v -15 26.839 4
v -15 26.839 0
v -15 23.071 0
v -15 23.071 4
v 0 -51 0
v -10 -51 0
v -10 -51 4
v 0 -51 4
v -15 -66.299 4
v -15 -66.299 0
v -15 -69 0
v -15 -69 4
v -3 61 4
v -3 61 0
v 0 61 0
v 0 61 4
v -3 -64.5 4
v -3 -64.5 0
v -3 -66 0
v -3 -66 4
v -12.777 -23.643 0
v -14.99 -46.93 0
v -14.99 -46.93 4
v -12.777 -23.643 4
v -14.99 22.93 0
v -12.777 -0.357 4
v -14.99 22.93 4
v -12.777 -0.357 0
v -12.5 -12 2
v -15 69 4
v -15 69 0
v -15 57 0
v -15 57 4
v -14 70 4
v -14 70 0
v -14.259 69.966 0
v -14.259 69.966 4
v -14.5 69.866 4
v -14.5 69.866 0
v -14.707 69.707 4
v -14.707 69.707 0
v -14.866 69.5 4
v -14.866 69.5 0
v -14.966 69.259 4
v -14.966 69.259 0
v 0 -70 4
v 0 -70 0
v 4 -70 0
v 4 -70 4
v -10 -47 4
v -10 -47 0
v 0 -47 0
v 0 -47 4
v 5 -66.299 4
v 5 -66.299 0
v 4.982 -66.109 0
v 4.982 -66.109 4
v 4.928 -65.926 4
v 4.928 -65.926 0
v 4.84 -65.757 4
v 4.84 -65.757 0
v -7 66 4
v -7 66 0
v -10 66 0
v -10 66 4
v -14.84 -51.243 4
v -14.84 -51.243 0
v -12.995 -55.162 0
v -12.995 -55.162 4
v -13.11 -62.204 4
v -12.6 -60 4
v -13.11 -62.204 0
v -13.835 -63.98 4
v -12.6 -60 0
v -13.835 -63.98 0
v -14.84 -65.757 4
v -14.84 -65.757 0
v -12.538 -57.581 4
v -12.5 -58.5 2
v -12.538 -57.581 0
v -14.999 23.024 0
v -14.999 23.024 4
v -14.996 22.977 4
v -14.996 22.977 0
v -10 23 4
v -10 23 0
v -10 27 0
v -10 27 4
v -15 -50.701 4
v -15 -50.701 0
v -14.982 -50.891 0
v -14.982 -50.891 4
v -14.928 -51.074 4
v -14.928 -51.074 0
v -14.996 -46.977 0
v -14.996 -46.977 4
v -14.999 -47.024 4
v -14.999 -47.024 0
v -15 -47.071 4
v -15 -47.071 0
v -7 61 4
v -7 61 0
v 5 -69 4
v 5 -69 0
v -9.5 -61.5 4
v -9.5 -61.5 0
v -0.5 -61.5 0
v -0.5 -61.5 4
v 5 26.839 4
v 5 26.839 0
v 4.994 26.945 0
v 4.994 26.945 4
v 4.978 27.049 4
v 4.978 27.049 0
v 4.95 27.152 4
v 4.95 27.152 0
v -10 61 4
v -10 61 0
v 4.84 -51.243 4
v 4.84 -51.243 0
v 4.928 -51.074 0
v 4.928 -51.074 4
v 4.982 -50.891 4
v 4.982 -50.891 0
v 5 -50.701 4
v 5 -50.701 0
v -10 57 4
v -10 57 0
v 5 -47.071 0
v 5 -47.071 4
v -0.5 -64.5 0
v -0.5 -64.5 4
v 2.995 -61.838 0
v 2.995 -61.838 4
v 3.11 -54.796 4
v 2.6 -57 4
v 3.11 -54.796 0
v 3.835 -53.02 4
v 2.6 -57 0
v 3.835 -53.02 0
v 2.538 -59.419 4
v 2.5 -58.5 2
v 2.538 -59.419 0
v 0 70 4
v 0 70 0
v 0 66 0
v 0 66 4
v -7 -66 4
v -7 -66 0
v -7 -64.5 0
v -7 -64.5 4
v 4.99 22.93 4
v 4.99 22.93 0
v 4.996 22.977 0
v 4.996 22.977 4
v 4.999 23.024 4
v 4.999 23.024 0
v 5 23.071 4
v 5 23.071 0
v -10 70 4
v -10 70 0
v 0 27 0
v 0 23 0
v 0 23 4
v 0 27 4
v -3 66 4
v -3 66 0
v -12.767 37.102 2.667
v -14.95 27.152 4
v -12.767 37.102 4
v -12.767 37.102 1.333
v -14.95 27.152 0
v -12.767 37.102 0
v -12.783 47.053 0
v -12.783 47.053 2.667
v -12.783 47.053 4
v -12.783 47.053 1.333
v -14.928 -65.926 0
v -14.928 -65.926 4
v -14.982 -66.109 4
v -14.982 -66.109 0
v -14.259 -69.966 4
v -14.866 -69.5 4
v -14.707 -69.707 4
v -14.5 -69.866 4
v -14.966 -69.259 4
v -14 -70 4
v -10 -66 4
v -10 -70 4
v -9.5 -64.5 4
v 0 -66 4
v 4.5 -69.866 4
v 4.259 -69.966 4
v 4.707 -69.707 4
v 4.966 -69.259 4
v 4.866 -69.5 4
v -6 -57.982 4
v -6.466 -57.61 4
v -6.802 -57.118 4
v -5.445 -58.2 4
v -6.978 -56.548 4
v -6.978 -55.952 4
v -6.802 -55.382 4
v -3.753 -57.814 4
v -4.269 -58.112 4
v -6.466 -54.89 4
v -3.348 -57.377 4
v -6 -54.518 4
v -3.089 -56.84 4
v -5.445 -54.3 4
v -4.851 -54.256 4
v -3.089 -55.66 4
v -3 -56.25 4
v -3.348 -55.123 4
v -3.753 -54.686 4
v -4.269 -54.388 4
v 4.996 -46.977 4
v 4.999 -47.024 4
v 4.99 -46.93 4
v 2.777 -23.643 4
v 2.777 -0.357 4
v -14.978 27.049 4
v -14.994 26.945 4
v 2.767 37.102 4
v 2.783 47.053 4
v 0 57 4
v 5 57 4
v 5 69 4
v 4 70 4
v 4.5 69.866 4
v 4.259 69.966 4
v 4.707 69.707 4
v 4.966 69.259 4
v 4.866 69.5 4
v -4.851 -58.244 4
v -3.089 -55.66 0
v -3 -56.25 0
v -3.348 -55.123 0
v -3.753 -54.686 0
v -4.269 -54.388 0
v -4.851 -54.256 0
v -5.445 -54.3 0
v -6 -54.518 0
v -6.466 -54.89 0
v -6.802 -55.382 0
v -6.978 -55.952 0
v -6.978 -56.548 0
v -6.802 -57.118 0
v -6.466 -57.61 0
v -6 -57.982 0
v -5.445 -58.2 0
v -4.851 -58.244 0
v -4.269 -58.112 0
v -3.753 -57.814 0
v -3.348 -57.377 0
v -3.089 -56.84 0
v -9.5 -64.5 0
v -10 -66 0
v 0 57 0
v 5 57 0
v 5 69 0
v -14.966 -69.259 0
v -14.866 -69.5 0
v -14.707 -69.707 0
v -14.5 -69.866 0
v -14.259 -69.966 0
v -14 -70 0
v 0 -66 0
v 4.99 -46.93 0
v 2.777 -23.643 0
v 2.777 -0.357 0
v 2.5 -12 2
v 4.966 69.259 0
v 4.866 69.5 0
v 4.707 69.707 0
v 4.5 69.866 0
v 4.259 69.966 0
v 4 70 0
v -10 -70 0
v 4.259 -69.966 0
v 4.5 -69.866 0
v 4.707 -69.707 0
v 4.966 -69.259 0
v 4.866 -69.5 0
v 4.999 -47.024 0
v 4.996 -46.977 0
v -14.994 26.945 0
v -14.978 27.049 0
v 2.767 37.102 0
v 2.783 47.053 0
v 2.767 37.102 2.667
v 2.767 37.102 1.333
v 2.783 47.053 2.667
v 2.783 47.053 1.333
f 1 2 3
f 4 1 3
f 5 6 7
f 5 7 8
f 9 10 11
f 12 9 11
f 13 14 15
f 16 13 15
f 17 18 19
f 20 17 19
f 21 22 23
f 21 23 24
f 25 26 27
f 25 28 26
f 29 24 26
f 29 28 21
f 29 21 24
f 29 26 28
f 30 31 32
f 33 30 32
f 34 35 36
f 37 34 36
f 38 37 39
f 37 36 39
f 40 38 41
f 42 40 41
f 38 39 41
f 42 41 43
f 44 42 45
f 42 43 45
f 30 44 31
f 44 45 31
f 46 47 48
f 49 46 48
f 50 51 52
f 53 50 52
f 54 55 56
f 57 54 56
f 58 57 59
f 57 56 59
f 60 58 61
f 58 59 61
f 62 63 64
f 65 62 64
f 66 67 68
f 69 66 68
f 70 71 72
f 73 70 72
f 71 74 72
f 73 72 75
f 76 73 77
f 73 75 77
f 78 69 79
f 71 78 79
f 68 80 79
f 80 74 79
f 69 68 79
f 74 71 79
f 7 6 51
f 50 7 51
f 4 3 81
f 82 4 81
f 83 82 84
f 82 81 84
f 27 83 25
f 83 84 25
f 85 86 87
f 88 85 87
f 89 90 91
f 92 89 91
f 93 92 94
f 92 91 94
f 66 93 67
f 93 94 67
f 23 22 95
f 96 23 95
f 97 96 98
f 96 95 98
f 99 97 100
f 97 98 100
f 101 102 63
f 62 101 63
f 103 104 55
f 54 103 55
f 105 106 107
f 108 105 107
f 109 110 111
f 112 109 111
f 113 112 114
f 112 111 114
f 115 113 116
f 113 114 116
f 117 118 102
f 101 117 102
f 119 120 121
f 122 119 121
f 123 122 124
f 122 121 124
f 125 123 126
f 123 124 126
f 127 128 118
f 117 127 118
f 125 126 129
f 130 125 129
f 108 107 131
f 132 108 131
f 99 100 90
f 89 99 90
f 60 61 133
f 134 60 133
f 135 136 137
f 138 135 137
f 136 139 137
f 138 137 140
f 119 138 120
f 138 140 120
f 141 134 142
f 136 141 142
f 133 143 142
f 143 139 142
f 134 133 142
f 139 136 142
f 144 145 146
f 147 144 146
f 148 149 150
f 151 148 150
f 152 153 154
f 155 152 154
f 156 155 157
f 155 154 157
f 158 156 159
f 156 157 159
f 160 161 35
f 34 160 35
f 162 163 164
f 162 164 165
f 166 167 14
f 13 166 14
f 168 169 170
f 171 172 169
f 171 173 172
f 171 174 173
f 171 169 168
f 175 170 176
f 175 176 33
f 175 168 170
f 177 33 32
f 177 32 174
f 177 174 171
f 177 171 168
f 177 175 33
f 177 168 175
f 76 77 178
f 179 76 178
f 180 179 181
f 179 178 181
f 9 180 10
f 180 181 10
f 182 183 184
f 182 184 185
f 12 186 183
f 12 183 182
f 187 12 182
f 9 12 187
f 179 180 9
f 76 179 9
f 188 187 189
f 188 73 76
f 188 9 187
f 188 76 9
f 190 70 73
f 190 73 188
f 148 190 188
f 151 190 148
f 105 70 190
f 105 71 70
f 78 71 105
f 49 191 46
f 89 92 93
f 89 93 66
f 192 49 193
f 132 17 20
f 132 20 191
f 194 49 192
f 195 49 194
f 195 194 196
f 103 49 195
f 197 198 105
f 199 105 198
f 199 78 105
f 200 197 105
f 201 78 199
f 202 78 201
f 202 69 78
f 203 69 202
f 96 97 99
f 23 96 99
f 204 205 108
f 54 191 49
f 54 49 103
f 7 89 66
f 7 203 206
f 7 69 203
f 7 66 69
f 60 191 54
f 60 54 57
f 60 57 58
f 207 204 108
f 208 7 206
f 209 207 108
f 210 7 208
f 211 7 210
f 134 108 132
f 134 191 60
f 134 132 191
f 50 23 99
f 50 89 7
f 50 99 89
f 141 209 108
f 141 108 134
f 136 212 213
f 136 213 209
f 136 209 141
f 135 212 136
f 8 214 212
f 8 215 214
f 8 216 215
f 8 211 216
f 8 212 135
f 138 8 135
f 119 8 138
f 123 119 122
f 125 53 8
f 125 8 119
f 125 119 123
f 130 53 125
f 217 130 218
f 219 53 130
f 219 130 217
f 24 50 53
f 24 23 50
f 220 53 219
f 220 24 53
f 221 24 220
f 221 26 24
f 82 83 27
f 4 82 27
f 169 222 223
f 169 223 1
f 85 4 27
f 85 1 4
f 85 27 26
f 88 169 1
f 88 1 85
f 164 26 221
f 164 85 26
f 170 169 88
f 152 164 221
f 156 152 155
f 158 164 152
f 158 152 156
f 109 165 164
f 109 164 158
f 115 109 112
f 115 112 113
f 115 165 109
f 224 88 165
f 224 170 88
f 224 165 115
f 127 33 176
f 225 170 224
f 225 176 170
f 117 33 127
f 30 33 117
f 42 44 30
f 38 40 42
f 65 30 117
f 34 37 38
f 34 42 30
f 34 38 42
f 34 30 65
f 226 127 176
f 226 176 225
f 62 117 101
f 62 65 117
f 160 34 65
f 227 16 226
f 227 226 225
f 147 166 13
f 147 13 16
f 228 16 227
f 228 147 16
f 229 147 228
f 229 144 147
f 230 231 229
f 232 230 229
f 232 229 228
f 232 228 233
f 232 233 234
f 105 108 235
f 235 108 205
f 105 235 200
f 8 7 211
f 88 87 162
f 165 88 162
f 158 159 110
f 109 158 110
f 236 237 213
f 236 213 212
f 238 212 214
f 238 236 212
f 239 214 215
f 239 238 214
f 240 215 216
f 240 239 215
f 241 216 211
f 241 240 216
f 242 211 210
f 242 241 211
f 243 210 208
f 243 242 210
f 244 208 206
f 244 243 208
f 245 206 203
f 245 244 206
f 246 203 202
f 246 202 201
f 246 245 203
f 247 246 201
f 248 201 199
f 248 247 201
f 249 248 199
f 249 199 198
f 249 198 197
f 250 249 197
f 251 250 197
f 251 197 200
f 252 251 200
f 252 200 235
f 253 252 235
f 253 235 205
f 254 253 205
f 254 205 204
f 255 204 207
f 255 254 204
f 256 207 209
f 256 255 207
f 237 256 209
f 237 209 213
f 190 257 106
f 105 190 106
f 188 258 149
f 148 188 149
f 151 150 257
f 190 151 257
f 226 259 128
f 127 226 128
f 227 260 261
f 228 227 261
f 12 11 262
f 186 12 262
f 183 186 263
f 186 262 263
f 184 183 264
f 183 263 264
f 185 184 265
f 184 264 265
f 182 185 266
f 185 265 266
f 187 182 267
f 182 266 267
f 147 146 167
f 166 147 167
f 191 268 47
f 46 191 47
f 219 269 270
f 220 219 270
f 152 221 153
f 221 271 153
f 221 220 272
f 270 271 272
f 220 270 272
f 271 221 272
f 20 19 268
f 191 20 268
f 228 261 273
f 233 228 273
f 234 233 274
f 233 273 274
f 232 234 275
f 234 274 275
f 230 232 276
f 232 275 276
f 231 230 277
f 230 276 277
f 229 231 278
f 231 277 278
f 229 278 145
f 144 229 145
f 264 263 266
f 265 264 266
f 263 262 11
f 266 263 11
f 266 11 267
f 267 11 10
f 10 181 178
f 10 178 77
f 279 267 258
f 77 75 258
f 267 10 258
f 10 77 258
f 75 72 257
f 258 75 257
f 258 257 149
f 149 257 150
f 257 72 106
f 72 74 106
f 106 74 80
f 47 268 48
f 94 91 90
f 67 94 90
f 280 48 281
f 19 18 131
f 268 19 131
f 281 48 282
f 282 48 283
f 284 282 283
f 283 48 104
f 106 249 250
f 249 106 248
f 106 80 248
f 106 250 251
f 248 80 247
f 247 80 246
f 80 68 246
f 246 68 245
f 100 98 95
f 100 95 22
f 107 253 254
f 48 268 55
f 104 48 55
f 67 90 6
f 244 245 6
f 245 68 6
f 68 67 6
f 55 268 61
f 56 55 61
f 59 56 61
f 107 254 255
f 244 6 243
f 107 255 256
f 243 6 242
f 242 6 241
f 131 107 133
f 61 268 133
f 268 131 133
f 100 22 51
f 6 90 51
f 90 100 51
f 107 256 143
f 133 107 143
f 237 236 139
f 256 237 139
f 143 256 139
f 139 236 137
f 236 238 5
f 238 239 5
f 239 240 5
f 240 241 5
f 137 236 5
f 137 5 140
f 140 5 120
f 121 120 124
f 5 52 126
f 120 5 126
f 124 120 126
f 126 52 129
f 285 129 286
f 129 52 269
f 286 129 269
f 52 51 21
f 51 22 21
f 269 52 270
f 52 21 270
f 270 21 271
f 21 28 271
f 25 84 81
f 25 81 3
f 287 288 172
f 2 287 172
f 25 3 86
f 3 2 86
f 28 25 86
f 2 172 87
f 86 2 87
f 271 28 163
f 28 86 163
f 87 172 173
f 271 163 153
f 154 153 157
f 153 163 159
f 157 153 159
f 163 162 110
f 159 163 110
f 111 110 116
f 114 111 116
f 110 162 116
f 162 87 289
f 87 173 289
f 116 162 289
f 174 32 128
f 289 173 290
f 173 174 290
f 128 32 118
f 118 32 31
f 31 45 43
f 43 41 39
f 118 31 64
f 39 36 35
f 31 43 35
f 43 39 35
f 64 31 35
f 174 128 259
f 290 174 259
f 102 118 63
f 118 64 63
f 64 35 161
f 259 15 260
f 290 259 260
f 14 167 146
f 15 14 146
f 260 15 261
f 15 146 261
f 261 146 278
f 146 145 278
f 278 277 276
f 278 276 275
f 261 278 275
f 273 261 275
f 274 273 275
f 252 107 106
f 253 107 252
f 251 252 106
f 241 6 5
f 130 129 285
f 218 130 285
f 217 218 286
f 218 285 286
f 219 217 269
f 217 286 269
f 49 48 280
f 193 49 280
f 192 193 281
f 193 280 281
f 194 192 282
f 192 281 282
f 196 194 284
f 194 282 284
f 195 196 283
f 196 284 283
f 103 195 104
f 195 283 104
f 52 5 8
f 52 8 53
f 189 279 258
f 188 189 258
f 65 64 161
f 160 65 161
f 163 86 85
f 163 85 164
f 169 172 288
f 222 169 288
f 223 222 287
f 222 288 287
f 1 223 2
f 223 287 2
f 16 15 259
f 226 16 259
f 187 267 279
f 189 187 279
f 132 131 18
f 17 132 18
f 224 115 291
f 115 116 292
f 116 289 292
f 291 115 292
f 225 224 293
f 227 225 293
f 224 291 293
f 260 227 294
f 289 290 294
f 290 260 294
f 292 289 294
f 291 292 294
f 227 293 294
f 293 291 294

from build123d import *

# Parameters (mm, degrees)
CROQUIS1_W              = 10
CROQUIS1_H              = 4
CROQUIS1_R              = 2
SALIENTE_EXTRUIR1_DEPTH = 4


with BuildPart() as part:
    # Croquis1 → Saliente-Extruir1 (new body)
    with BuildSketch(Plane.XY):
        with BuildLine():
            Line((-14, -70), (-10, -70))
            Line((-10, -70), (-10, -66))
            Line((-10, -66), (-7, -66))
            Line((-7, -66), (-7, -64.5))
            Line((-7, -64.5), (-9.5, -64.5))
            Line((-9.5, -64.5), (-9.5, -61.5))
            Line((-9.5, -61.5), (-0.5, -61.5))
            Line((-0.5, -61.5), (-0.5, -64.5))
            Line((-0.5, -64.5), (-3, -64.5))
            Line((-3, -64.5), (-3, -66))
            Line((-3, -66), (0, -66))
            Line((0, -66), (0, -70))
            Line((0, -70), (4, -70))
            ThreePointArc((4, -70), (4.707106781, -69.707106781), (5, -69))
            Line((5, -69), (5, -66.298618771))
            ThreePointArc((5, -66.298618771), (4.959256868, -66.016083354), (4.840347477, -65.756570693))
            add(Edge.make_bspline(
                [(4.840347477, -65.756570693), (3.280115826, -63.337713796), (1.719884174, -58.5), (3.280115826, -53.662286204), (4.840347477, -51.243429307)],
                knots=[0.01622862, 0.01622862, 0.01622862, 0.01622862, 0.5, 0.98377138, 0.98377138, 0.98377138, 0.98377138], degree=3))
            ThreePointArc((4.840347477, -51.243429307), (4.959256868, -50.983916646), (5, -50.701381229))
            Line((5, -50.701381229), (5, -47.070997241))
            ThreePointArc((5, -47.070997241), (4.997494145, -47.000248166), (4.989989137, -46.929853666))
            add(Edge.make_bspline(
                [(4.989989137, -46.929853666), (3.329996379, -35.286569111), (1.670003621, -12), (3.329996379, 11.286569111), (4.989989137, 22.929853666)],
                knots=[0.00100209, 0.00100209, 0.00100209, 0.00100209, 0.5, 0.99899791, 0.99899791, 0.99899791, 0.99899791], degree=3))
            ThreePointArc((4.989989137, 22.929853666), (4.997494145, 23.000248166), (5, 23.070997241))
            Line((5, 23.070997241), (5, 26.838505544))
            ThreePointArc((5, 26.838505544), (4.987329796, 26.997187218), (4.949640253, 27.151847833))
            add(Edge.make_bspline(
                [(4.949640253, 27.151847833), (1.666752066, 37.101231889), (1.683538525, 47.056062614), (5, 57)],
                knots=[0.005061594, 0.005061594, 0.005061594, 0.005061594, 1, 1, 1, 1], degree=3))
            Line((5, 57), (5, 69))
            ThreePointArc((5, 69), (4.707106781, 69.707106781), (4, 70))
            Line((4, 70), (0, 70))
            Line((0, 70), (0, 66))
            Line((0, 66), (-3, 66))
            Line((-3, 66), (-3, 61))
            Line((-3, 61), (0, 61))
            Line((0, 61), (0, 57))
            Line((0, 57), (-10, 57))
            Line((-10, 57), (-10, 61))
            Line((-10, 61), (-7, 61))
            Line((-7, 61), (-7, 66))
            Line((-7, 66), (-10, 66))
            Line((-10, 66), (-10, 70))
            Line((-10, 70), (-14, 70))
            ThreePointArc((-14, 70), (-14.707106781, 69.707106781), (-15, 69))
            Line((-15, 69), (-15, 57))
            add(Edge.make_bspline(
                [(-14.949640253, 27.151847833), (-11.666752066, 37.101231889), (-11.683538525, 47.056062614), (-15, 57)],
                knots=[0.005061594, 0.005061594, 0.005061594, 0.005061594, 1, 1, 1, 1], degree=3))
            ThreePointArc((-14.949640253, 27.151847833), (-14.987329796, 26.997187218), (-15, 26.838505544))
            Line((-15, 26.838505544), (-15, 23.070997241))
            ThreePointArc((-15, 23.070997241), (-14.997494145, 23.000248166), (-14.989989137, 22.929853666))
            add(Edge.make_bspline(
                [(-14.989989137, -46.929853666), (-13.329996379, -35.286569111), (-11.670003621, -12), (-13.329996379, 11.286569111), (-14.989989137, 22.929853666)],
                knots=[0.00100209, 0.00100209, 0.00100209, 0.00100209, 0.5, 0.99899791, 0.99899791, 0.99899791, 0.99899791], degree=3))
            ThreePointArc((-14.989989137, -46.929853666), (-14.997494145, -47.000248166), (-15, -47.070997241))
            Line((-15, -47.070997241), (-15, -50.701381229))
            ThreePointArc((-15, -50.701381229), (-14.959256868, -50.983916646), (-14.840347477, -51.243429307))
            add(Edge.make_bspline(
                [(-14.840347477, -51.243429307), (-13.280115826, -53.662286204), (-11.719884174, -58.5), (-13.280115826, -63.337713796), (-14.840347477, -65.756570693)],
                knots=[0.01622862, 0.01622862, 0.01622862, 0.01622862, 0.5, 0.98377138, 0.98377138, 0.98377138, 0.98377138], degree=3))
            ThreePointArc((-14.840347477, -65.756570693), (-14.959256868, -66.016083354), (-15, -66.298618771))
            Line((-15, -66.298618771), (-15, -69))
            ThreePointArc((-15, -69), (-14.707106781, -69.707106781), (-14, -70))
        make_face()
        with Locations((-5, 25)):
            Rectangle(CROQUIS1_W, CROQUIS1_H, mode=Mode.SUBTRACT)
        with Locations((-5, -49)):
            Rectangle(CROQUIS1_W, CROQUIS1_H, mode=Mode.SUBTRACT)
        with Locations((-5, -56.25)):
            Circle(CROQUIS1_R, mode=Mode.SUBTRACT)
    extrude(amount=SALIENTE_EXTRUIR1_DEPTH)


solid = part.part
